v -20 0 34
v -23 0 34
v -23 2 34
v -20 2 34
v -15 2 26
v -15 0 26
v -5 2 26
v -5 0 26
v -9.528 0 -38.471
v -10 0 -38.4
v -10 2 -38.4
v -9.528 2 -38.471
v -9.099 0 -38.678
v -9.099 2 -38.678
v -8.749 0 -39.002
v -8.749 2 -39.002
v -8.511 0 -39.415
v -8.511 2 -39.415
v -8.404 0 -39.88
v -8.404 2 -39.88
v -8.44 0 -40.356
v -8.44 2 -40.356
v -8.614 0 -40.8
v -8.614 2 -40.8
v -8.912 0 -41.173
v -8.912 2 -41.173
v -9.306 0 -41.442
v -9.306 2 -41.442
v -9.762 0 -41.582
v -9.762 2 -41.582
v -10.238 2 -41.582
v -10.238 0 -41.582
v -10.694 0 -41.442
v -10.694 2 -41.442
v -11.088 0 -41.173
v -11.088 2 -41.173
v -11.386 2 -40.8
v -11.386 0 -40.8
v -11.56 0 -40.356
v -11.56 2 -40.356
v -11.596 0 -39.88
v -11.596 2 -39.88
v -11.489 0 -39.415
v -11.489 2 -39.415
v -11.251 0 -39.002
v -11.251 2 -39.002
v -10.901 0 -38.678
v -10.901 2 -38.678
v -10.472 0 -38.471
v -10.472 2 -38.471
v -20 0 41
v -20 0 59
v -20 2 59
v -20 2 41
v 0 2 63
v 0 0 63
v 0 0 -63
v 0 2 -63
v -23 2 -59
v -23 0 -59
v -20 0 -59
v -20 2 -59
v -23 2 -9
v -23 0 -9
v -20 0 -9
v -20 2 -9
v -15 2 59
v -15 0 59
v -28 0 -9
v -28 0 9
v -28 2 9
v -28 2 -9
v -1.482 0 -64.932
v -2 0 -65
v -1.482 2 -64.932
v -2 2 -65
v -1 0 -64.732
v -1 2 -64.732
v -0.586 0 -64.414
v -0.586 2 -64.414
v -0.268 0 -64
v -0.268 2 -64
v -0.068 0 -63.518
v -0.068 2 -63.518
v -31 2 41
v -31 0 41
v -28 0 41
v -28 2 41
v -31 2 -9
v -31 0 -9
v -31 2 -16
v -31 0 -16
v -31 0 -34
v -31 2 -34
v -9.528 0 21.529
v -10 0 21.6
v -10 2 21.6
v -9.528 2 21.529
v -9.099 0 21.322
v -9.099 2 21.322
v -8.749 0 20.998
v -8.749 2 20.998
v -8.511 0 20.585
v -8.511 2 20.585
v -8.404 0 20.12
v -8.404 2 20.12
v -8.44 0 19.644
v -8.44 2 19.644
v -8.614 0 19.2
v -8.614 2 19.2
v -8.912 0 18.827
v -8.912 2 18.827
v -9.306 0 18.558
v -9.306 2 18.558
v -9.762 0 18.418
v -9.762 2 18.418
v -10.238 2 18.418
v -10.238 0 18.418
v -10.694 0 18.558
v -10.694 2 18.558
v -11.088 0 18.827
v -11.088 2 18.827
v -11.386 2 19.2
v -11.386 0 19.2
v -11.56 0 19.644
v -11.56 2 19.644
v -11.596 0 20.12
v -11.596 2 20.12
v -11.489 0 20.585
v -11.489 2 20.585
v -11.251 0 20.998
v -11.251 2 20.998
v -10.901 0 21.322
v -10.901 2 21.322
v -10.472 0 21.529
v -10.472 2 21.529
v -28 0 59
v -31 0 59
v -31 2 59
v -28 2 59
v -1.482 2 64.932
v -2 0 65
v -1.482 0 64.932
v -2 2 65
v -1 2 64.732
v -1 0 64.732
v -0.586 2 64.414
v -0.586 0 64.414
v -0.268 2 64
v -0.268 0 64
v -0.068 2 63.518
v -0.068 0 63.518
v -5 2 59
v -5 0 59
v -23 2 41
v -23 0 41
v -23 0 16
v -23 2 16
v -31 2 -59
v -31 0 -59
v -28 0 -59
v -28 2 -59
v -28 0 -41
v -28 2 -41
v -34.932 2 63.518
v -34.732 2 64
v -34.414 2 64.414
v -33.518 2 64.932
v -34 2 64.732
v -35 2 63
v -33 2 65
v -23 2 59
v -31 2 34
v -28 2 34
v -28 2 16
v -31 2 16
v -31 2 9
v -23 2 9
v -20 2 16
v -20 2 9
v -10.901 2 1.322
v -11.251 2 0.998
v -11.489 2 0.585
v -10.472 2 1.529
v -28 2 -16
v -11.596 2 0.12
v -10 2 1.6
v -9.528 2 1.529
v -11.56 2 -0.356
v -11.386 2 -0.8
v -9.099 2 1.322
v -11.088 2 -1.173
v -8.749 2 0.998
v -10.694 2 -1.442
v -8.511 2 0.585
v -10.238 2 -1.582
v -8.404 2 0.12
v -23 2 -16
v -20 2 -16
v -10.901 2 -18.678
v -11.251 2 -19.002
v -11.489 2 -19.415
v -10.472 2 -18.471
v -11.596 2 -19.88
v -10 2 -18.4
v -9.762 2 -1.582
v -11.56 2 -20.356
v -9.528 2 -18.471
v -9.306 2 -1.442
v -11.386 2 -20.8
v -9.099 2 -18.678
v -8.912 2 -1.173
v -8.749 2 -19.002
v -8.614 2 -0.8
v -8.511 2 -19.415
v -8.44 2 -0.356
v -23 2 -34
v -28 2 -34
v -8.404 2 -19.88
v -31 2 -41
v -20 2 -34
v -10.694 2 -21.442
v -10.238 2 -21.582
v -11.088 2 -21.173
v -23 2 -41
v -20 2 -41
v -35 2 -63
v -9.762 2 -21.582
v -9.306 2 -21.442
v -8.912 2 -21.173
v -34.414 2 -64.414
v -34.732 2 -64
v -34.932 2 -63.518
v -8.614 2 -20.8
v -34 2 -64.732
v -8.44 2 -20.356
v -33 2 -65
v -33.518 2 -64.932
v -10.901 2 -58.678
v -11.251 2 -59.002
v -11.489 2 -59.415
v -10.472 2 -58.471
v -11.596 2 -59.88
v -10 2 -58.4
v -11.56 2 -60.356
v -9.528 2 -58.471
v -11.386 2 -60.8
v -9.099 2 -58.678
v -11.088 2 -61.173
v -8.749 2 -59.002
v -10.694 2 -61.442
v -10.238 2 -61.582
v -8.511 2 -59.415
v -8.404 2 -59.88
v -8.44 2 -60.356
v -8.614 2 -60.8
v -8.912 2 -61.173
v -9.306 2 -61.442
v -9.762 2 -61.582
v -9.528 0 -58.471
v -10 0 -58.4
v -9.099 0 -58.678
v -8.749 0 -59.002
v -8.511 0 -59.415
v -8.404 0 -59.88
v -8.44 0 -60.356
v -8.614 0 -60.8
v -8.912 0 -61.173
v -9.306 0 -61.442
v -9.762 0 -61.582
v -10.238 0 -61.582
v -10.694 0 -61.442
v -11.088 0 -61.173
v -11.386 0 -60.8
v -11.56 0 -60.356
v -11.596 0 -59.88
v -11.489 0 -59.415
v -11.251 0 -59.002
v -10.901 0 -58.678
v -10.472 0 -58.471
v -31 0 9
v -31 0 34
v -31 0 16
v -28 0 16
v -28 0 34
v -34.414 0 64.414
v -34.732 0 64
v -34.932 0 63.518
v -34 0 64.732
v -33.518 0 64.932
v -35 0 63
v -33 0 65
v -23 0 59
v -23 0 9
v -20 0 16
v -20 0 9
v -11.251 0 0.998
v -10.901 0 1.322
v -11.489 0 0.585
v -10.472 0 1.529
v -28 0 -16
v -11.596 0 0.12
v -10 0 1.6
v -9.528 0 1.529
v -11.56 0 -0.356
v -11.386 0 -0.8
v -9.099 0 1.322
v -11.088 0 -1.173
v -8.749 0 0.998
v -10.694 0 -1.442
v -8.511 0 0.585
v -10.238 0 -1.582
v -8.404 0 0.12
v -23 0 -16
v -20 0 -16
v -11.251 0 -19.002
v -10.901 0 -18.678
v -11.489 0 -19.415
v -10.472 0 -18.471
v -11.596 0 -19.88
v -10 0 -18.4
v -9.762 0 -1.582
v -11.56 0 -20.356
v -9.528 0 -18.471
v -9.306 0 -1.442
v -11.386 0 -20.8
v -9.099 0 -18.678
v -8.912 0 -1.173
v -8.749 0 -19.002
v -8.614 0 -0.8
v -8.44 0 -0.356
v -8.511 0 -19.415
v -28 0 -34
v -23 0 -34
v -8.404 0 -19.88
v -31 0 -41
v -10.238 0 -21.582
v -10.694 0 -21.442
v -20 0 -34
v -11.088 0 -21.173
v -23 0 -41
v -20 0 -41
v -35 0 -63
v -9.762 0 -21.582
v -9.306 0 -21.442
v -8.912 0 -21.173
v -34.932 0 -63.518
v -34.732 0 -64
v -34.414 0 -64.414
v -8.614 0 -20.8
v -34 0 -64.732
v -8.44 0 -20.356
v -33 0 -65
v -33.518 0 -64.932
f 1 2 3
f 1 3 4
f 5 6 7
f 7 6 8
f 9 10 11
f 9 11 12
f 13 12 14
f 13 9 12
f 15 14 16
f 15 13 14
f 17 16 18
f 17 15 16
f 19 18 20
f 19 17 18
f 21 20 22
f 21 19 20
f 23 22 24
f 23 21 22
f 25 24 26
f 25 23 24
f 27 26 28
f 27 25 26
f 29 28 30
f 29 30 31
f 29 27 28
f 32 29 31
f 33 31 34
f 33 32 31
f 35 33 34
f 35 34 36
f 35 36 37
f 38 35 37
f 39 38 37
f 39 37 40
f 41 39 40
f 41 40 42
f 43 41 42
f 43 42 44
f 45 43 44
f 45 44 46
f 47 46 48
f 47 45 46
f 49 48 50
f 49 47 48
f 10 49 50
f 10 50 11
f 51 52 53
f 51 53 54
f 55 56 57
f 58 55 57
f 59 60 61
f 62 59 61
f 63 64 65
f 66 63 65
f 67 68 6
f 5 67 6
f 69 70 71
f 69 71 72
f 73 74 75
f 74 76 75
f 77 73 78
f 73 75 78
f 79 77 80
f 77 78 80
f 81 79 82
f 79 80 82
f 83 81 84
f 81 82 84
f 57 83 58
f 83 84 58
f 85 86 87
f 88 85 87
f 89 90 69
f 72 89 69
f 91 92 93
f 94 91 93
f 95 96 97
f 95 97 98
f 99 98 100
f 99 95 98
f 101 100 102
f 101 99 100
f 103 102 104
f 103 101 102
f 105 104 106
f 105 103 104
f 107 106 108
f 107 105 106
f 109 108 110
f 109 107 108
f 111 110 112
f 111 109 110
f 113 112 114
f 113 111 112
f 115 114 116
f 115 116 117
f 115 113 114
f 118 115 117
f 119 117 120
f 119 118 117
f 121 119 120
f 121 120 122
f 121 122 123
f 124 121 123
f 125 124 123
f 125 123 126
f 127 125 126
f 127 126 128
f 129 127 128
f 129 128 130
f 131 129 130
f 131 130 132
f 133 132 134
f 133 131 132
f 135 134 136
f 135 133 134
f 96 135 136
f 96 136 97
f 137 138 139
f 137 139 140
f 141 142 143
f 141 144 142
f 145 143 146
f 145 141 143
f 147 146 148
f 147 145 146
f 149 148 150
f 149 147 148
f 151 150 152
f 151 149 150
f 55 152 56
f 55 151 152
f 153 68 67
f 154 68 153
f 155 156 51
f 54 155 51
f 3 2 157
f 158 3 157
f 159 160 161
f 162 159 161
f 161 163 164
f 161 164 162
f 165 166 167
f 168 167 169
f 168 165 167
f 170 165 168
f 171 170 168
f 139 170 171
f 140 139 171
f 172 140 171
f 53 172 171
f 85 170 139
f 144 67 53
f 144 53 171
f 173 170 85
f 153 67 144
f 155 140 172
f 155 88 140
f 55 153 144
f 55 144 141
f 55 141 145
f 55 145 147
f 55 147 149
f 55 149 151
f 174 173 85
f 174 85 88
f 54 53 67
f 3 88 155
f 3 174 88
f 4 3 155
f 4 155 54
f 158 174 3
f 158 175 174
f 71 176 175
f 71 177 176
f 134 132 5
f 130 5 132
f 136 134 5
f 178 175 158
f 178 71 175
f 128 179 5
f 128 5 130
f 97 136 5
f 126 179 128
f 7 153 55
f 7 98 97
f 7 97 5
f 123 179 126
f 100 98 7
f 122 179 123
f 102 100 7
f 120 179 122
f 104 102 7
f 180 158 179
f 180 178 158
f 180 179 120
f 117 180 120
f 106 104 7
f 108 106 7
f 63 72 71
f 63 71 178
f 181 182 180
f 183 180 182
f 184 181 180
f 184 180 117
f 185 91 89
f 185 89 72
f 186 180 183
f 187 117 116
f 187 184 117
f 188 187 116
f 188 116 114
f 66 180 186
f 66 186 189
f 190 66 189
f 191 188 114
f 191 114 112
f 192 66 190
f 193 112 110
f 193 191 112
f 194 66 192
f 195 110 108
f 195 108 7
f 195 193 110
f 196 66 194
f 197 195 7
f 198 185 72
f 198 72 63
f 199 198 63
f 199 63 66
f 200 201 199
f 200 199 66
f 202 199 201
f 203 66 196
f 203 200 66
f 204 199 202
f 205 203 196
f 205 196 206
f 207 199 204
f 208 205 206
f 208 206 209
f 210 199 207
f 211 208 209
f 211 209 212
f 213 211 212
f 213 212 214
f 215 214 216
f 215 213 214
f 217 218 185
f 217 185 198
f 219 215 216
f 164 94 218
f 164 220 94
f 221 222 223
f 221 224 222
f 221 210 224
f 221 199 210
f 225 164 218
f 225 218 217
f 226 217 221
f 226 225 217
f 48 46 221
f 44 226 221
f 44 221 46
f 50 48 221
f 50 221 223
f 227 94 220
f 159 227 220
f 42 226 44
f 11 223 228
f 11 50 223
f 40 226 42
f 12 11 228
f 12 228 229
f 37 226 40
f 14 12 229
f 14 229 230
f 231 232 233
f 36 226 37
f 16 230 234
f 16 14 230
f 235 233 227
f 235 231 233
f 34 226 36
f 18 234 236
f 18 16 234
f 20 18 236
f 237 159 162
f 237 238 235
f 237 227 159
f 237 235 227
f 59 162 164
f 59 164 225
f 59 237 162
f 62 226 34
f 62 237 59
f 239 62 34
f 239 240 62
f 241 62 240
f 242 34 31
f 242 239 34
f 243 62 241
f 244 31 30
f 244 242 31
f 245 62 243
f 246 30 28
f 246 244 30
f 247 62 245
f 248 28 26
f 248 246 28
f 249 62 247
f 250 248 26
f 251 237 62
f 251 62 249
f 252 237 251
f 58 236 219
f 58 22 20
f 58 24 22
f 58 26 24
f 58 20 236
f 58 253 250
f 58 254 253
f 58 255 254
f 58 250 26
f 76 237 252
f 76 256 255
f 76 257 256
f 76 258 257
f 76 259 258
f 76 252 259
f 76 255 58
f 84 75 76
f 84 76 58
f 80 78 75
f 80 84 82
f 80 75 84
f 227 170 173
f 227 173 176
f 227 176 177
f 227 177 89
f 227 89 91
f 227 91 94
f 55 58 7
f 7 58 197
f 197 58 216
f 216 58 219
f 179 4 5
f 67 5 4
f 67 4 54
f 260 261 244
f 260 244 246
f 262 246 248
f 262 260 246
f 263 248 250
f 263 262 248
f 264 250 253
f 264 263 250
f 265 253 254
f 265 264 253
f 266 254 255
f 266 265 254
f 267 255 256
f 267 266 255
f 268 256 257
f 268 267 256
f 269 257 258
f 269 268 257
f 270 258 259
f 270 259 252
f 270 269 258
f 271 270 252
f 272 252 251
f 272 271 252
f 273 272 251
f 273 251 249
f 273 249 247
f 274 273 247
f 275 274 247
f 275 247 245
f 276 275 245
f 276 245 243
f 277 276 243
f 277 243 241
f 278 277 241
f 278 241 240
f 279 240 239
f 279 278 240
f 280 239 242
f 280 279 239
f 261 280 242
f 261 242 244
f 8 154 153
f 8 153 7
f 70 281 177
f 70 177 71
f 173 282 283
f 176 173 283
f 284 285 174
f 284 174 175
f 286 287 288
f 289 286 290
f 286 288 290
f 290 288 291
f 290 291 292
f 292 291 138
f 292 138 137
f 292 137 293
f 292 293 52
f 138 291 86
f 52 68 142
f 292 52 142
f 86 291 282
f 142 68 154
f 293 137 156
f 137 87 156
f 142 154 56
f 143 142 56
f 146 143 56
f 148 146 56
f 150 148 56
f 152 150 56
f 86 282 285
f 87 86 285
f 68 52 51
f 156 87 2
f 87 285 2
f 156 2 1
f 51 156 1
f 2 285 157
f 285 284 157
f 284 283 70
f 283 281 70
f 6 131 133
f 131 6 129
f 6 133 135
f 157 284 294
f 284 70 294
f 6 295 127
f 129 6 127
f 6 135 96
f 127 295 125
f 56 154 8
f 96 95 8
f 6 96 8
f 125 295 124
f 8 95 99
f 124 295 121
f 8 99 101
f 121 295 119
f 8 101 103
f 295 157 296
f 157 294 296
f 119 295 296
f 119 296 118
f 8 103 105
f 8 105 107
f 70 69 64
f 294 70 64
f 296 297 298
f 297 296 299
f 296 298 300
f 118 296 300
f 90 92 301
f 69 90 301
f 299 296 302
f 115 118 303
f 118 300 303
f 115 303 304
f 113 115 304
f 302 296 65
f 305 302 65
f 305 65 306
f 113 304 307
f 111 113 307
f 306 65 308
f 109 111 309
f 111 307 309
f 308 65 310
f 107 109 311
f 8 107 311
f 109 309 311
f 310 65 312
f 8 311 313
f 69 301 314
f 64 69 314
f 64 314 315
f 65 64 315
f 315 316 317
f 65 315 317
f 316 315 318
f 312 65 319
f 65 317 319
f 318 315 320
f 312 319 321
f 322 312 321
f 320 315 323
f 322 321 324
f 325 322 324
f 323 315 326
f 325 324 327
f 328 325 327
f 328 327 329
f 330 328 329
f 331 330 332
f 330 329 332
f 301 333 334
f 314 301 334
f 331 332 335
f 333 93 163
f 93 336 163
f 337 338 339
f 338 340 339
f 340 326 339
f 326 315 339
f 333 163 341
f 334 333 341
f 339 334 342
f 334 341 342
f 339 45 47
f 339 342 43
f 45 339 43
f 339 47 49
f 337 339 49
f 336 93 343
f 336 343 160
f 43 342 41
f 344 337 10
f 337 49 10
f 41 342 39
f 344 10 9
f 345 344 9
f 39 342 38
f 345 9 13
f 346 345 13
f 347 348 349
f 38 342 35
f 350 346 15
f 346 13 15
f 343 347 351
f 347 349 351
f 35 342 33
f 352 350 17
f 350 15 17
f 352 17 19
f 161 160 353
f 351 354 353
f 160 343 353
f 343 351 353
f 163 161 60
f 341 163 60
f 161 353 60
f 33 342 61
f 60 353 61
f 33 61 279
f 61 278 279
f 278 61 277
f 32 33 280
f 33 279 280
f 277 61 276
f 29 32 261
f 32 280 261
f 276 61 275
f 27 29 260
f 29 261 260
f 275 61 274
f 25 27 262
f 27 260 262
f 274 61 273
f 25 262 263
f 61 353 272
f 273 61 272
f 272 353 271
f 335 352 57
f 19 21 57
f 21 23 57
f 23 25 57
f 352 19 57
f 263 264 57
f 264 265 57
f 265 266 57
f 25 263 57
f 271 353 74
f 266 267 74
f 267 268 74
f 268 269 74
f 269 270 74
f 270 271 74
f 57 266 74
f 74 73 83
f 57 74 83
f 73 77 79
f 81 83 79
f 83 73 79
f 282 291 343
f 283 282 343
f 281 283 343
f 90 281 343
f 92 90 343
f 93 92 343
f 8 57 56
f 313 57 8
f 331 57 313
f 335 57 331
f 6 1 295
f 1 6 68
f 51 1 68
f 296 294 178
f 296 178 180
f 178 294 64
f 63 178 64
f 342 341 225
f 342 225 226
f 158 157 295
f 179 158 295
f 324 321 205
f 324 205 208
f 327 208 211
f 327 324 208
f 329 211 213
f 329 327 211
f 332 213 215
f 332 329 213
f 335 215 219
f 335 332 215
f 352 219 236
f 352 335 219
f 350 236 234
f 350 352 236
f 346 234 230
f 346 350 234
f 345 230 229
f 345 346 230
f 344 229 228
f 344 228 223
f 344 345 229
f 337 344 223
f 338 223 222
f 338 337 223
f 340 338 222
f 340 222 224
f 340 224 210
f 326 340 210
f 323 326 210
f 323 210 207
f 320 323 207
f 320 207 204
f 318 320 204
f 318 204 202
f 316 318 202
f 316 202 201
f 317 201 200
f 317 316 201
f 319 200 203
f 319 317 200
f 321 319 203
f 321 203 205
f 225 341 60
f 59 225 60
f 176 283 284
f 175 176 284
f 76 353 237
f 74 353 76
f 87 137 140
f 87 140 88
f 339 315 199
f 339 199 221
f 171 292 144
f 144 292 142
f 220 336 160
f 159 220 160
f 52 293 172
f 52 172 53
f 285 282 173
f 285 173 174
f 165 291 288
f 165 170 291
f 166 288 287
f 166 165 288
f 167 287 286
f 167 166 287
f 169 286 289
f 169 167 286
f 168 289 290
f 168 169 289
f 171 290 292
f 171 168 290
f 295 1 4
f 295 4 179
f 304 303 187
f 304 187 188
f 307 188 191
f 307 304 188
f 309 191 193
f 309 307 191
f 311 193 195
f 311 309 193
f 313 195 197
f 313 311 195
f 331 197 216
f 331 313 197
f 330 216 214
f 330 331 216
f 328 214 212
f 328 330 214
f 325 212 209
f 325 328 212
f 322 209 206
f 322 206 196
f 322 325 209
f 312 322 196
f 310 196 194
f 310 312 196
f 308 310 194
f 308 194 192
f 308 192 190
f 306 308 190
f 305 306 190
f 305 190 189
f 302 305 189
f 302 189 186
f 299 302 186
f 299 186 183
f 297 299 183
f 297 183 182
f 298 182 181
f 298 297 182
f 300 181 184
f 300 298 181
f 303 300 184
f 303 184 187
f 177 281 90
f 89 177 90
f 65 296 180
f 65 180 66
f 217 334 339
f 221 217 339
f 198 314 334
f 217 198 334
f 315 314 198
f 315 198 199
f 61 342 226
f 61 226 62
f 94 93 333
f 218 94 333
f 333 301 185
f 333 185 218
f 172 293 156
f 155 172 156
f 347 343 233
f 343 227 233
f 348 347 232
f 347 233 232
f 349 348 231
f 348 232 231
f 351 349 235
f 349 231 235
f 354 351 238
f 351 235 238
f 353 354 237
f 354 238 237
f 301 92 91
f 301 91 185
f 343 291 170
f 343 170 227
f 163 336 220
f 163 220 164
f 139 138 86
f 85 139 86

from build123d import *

# Parameters (mm, degrees)
SKETCH_1_W      = 35
SKETCH_1_H      = 130
SKETCH_1_R      = 1.6
SKETCH_1_W_2    = 3
SKETCH_1_H_2    = 18
SKETCH_1_W_3    = 10
SKETCH_1_H_3    = 33
EXTRUDE_1_DEPTH = 2
FILLET_1_R      = 2


with BuildPart() as part:
    # 草图1 → 凸台-拉伸1 (new body)
    with BuildSketch(Plane(origin=(0, 0, 0), x_dir=(1, 0, 0), z_dir=(0, 1, 0))):
        with Locations((-17.5, 0)):
            Rectangle(SKETCH_1_W, SKETCH_1_H)
        with Locations(Location((-10, 60, 0), (0, 0, 270))):
            Circle(SKETCH_1_R, mode=Mode.SUBTRACT)
        with Locations(Location((-10, 40, 0), (0, 0, 270))):
            Circle(SKETCH_1_R, mode=Mode.SUBTRACT)
        with Locations(Location((-10, 20, 0), (0, 0, 270))):
            Circle(SKETCH_1_R, mode=Mode.SUBTRACT)
        with Locations(Location((-10, 0, 0), (0, 0, 270))):
            Circle(SKETCH_1_R, mode=Mode.SUBTRACT)
        with Locations(Location((-10, -20, 0), (0, 0, 270))):
            Circle(SKETCH_1_R, mode=Mode.SUBTRACT)
        with Locations((-29.5, 50)):
            Rectangle(SKETCH_1_W_2, SKETCH_1_H_2, mode=Mode.SUBTRACT)
        with Locations((-21.5, 50)):
            Rectangle(SKETCH_1_W_2, SKETCH_1_H_2, mode=Mode.SUBTRACT)
        with Locations((-29.5, 25)):
            Rectangle(SKETCH_1_W_2, SKETCH_1_H_2, mode=Mode.SUBTRACT)
        with Locations((-29.5, 0)):
            Rectangle(SKETCH_1_W_2, SKETCH_1_H_2, mode=Mode.SUBTRACT)
        with Locations((-29.5, -25)):
            Rectangle(SKETCH_1_W_2, SKETCH_1_H_2, mode=Mode.SUBTRACT)
        with Locations((-29.5, -50)):
            Rectangle(SKETCH_1_W_2, SKETCH_1_H_2, mode=Mode.SUBTRACT)
        with Locations((-21.5, 25)):
            Rectangle(SKETCH_1_W_2, SKETCH_1_H_2, mode=Mode.SUBTRACT)
        with Locations((-21.5, 0)):
            Rectangle(SKETCH_1_W_2, SKETCH_1_H_2, mode=Mode.SUBTRACT)
        with Locations((-21.5, -25)):
            Rectangle(SKETCH_1_W_2, SKETCH_1_H_2, mode=Mode.SUBTRACT)
        with Locations((-21.5, -50)):
            Rectangle(SKETCH_1_W_2, SKETCH_1_H_2, mode=Mode.SUBTRACT)
        with Locations((-10, -42.5)):
            Rectangle(SKETCH_1_W_3, SKETCH_1_H_3, mode=Mode.SUBTRACT)
    extrude(amount=EXTRUDE_1_DEPTH)

    # 圆角1
    fillet_1_edges = [part.edges().sort_by_distance(p)[0] for p in [
        (0, 1, 65),
        (-35, 1, 65),
        (-35, 1, -65),
        (0, 1, -65),
    ]]
    fillet(fillet_1_edges, radius=FILLET_1_R)


solid = part.part
